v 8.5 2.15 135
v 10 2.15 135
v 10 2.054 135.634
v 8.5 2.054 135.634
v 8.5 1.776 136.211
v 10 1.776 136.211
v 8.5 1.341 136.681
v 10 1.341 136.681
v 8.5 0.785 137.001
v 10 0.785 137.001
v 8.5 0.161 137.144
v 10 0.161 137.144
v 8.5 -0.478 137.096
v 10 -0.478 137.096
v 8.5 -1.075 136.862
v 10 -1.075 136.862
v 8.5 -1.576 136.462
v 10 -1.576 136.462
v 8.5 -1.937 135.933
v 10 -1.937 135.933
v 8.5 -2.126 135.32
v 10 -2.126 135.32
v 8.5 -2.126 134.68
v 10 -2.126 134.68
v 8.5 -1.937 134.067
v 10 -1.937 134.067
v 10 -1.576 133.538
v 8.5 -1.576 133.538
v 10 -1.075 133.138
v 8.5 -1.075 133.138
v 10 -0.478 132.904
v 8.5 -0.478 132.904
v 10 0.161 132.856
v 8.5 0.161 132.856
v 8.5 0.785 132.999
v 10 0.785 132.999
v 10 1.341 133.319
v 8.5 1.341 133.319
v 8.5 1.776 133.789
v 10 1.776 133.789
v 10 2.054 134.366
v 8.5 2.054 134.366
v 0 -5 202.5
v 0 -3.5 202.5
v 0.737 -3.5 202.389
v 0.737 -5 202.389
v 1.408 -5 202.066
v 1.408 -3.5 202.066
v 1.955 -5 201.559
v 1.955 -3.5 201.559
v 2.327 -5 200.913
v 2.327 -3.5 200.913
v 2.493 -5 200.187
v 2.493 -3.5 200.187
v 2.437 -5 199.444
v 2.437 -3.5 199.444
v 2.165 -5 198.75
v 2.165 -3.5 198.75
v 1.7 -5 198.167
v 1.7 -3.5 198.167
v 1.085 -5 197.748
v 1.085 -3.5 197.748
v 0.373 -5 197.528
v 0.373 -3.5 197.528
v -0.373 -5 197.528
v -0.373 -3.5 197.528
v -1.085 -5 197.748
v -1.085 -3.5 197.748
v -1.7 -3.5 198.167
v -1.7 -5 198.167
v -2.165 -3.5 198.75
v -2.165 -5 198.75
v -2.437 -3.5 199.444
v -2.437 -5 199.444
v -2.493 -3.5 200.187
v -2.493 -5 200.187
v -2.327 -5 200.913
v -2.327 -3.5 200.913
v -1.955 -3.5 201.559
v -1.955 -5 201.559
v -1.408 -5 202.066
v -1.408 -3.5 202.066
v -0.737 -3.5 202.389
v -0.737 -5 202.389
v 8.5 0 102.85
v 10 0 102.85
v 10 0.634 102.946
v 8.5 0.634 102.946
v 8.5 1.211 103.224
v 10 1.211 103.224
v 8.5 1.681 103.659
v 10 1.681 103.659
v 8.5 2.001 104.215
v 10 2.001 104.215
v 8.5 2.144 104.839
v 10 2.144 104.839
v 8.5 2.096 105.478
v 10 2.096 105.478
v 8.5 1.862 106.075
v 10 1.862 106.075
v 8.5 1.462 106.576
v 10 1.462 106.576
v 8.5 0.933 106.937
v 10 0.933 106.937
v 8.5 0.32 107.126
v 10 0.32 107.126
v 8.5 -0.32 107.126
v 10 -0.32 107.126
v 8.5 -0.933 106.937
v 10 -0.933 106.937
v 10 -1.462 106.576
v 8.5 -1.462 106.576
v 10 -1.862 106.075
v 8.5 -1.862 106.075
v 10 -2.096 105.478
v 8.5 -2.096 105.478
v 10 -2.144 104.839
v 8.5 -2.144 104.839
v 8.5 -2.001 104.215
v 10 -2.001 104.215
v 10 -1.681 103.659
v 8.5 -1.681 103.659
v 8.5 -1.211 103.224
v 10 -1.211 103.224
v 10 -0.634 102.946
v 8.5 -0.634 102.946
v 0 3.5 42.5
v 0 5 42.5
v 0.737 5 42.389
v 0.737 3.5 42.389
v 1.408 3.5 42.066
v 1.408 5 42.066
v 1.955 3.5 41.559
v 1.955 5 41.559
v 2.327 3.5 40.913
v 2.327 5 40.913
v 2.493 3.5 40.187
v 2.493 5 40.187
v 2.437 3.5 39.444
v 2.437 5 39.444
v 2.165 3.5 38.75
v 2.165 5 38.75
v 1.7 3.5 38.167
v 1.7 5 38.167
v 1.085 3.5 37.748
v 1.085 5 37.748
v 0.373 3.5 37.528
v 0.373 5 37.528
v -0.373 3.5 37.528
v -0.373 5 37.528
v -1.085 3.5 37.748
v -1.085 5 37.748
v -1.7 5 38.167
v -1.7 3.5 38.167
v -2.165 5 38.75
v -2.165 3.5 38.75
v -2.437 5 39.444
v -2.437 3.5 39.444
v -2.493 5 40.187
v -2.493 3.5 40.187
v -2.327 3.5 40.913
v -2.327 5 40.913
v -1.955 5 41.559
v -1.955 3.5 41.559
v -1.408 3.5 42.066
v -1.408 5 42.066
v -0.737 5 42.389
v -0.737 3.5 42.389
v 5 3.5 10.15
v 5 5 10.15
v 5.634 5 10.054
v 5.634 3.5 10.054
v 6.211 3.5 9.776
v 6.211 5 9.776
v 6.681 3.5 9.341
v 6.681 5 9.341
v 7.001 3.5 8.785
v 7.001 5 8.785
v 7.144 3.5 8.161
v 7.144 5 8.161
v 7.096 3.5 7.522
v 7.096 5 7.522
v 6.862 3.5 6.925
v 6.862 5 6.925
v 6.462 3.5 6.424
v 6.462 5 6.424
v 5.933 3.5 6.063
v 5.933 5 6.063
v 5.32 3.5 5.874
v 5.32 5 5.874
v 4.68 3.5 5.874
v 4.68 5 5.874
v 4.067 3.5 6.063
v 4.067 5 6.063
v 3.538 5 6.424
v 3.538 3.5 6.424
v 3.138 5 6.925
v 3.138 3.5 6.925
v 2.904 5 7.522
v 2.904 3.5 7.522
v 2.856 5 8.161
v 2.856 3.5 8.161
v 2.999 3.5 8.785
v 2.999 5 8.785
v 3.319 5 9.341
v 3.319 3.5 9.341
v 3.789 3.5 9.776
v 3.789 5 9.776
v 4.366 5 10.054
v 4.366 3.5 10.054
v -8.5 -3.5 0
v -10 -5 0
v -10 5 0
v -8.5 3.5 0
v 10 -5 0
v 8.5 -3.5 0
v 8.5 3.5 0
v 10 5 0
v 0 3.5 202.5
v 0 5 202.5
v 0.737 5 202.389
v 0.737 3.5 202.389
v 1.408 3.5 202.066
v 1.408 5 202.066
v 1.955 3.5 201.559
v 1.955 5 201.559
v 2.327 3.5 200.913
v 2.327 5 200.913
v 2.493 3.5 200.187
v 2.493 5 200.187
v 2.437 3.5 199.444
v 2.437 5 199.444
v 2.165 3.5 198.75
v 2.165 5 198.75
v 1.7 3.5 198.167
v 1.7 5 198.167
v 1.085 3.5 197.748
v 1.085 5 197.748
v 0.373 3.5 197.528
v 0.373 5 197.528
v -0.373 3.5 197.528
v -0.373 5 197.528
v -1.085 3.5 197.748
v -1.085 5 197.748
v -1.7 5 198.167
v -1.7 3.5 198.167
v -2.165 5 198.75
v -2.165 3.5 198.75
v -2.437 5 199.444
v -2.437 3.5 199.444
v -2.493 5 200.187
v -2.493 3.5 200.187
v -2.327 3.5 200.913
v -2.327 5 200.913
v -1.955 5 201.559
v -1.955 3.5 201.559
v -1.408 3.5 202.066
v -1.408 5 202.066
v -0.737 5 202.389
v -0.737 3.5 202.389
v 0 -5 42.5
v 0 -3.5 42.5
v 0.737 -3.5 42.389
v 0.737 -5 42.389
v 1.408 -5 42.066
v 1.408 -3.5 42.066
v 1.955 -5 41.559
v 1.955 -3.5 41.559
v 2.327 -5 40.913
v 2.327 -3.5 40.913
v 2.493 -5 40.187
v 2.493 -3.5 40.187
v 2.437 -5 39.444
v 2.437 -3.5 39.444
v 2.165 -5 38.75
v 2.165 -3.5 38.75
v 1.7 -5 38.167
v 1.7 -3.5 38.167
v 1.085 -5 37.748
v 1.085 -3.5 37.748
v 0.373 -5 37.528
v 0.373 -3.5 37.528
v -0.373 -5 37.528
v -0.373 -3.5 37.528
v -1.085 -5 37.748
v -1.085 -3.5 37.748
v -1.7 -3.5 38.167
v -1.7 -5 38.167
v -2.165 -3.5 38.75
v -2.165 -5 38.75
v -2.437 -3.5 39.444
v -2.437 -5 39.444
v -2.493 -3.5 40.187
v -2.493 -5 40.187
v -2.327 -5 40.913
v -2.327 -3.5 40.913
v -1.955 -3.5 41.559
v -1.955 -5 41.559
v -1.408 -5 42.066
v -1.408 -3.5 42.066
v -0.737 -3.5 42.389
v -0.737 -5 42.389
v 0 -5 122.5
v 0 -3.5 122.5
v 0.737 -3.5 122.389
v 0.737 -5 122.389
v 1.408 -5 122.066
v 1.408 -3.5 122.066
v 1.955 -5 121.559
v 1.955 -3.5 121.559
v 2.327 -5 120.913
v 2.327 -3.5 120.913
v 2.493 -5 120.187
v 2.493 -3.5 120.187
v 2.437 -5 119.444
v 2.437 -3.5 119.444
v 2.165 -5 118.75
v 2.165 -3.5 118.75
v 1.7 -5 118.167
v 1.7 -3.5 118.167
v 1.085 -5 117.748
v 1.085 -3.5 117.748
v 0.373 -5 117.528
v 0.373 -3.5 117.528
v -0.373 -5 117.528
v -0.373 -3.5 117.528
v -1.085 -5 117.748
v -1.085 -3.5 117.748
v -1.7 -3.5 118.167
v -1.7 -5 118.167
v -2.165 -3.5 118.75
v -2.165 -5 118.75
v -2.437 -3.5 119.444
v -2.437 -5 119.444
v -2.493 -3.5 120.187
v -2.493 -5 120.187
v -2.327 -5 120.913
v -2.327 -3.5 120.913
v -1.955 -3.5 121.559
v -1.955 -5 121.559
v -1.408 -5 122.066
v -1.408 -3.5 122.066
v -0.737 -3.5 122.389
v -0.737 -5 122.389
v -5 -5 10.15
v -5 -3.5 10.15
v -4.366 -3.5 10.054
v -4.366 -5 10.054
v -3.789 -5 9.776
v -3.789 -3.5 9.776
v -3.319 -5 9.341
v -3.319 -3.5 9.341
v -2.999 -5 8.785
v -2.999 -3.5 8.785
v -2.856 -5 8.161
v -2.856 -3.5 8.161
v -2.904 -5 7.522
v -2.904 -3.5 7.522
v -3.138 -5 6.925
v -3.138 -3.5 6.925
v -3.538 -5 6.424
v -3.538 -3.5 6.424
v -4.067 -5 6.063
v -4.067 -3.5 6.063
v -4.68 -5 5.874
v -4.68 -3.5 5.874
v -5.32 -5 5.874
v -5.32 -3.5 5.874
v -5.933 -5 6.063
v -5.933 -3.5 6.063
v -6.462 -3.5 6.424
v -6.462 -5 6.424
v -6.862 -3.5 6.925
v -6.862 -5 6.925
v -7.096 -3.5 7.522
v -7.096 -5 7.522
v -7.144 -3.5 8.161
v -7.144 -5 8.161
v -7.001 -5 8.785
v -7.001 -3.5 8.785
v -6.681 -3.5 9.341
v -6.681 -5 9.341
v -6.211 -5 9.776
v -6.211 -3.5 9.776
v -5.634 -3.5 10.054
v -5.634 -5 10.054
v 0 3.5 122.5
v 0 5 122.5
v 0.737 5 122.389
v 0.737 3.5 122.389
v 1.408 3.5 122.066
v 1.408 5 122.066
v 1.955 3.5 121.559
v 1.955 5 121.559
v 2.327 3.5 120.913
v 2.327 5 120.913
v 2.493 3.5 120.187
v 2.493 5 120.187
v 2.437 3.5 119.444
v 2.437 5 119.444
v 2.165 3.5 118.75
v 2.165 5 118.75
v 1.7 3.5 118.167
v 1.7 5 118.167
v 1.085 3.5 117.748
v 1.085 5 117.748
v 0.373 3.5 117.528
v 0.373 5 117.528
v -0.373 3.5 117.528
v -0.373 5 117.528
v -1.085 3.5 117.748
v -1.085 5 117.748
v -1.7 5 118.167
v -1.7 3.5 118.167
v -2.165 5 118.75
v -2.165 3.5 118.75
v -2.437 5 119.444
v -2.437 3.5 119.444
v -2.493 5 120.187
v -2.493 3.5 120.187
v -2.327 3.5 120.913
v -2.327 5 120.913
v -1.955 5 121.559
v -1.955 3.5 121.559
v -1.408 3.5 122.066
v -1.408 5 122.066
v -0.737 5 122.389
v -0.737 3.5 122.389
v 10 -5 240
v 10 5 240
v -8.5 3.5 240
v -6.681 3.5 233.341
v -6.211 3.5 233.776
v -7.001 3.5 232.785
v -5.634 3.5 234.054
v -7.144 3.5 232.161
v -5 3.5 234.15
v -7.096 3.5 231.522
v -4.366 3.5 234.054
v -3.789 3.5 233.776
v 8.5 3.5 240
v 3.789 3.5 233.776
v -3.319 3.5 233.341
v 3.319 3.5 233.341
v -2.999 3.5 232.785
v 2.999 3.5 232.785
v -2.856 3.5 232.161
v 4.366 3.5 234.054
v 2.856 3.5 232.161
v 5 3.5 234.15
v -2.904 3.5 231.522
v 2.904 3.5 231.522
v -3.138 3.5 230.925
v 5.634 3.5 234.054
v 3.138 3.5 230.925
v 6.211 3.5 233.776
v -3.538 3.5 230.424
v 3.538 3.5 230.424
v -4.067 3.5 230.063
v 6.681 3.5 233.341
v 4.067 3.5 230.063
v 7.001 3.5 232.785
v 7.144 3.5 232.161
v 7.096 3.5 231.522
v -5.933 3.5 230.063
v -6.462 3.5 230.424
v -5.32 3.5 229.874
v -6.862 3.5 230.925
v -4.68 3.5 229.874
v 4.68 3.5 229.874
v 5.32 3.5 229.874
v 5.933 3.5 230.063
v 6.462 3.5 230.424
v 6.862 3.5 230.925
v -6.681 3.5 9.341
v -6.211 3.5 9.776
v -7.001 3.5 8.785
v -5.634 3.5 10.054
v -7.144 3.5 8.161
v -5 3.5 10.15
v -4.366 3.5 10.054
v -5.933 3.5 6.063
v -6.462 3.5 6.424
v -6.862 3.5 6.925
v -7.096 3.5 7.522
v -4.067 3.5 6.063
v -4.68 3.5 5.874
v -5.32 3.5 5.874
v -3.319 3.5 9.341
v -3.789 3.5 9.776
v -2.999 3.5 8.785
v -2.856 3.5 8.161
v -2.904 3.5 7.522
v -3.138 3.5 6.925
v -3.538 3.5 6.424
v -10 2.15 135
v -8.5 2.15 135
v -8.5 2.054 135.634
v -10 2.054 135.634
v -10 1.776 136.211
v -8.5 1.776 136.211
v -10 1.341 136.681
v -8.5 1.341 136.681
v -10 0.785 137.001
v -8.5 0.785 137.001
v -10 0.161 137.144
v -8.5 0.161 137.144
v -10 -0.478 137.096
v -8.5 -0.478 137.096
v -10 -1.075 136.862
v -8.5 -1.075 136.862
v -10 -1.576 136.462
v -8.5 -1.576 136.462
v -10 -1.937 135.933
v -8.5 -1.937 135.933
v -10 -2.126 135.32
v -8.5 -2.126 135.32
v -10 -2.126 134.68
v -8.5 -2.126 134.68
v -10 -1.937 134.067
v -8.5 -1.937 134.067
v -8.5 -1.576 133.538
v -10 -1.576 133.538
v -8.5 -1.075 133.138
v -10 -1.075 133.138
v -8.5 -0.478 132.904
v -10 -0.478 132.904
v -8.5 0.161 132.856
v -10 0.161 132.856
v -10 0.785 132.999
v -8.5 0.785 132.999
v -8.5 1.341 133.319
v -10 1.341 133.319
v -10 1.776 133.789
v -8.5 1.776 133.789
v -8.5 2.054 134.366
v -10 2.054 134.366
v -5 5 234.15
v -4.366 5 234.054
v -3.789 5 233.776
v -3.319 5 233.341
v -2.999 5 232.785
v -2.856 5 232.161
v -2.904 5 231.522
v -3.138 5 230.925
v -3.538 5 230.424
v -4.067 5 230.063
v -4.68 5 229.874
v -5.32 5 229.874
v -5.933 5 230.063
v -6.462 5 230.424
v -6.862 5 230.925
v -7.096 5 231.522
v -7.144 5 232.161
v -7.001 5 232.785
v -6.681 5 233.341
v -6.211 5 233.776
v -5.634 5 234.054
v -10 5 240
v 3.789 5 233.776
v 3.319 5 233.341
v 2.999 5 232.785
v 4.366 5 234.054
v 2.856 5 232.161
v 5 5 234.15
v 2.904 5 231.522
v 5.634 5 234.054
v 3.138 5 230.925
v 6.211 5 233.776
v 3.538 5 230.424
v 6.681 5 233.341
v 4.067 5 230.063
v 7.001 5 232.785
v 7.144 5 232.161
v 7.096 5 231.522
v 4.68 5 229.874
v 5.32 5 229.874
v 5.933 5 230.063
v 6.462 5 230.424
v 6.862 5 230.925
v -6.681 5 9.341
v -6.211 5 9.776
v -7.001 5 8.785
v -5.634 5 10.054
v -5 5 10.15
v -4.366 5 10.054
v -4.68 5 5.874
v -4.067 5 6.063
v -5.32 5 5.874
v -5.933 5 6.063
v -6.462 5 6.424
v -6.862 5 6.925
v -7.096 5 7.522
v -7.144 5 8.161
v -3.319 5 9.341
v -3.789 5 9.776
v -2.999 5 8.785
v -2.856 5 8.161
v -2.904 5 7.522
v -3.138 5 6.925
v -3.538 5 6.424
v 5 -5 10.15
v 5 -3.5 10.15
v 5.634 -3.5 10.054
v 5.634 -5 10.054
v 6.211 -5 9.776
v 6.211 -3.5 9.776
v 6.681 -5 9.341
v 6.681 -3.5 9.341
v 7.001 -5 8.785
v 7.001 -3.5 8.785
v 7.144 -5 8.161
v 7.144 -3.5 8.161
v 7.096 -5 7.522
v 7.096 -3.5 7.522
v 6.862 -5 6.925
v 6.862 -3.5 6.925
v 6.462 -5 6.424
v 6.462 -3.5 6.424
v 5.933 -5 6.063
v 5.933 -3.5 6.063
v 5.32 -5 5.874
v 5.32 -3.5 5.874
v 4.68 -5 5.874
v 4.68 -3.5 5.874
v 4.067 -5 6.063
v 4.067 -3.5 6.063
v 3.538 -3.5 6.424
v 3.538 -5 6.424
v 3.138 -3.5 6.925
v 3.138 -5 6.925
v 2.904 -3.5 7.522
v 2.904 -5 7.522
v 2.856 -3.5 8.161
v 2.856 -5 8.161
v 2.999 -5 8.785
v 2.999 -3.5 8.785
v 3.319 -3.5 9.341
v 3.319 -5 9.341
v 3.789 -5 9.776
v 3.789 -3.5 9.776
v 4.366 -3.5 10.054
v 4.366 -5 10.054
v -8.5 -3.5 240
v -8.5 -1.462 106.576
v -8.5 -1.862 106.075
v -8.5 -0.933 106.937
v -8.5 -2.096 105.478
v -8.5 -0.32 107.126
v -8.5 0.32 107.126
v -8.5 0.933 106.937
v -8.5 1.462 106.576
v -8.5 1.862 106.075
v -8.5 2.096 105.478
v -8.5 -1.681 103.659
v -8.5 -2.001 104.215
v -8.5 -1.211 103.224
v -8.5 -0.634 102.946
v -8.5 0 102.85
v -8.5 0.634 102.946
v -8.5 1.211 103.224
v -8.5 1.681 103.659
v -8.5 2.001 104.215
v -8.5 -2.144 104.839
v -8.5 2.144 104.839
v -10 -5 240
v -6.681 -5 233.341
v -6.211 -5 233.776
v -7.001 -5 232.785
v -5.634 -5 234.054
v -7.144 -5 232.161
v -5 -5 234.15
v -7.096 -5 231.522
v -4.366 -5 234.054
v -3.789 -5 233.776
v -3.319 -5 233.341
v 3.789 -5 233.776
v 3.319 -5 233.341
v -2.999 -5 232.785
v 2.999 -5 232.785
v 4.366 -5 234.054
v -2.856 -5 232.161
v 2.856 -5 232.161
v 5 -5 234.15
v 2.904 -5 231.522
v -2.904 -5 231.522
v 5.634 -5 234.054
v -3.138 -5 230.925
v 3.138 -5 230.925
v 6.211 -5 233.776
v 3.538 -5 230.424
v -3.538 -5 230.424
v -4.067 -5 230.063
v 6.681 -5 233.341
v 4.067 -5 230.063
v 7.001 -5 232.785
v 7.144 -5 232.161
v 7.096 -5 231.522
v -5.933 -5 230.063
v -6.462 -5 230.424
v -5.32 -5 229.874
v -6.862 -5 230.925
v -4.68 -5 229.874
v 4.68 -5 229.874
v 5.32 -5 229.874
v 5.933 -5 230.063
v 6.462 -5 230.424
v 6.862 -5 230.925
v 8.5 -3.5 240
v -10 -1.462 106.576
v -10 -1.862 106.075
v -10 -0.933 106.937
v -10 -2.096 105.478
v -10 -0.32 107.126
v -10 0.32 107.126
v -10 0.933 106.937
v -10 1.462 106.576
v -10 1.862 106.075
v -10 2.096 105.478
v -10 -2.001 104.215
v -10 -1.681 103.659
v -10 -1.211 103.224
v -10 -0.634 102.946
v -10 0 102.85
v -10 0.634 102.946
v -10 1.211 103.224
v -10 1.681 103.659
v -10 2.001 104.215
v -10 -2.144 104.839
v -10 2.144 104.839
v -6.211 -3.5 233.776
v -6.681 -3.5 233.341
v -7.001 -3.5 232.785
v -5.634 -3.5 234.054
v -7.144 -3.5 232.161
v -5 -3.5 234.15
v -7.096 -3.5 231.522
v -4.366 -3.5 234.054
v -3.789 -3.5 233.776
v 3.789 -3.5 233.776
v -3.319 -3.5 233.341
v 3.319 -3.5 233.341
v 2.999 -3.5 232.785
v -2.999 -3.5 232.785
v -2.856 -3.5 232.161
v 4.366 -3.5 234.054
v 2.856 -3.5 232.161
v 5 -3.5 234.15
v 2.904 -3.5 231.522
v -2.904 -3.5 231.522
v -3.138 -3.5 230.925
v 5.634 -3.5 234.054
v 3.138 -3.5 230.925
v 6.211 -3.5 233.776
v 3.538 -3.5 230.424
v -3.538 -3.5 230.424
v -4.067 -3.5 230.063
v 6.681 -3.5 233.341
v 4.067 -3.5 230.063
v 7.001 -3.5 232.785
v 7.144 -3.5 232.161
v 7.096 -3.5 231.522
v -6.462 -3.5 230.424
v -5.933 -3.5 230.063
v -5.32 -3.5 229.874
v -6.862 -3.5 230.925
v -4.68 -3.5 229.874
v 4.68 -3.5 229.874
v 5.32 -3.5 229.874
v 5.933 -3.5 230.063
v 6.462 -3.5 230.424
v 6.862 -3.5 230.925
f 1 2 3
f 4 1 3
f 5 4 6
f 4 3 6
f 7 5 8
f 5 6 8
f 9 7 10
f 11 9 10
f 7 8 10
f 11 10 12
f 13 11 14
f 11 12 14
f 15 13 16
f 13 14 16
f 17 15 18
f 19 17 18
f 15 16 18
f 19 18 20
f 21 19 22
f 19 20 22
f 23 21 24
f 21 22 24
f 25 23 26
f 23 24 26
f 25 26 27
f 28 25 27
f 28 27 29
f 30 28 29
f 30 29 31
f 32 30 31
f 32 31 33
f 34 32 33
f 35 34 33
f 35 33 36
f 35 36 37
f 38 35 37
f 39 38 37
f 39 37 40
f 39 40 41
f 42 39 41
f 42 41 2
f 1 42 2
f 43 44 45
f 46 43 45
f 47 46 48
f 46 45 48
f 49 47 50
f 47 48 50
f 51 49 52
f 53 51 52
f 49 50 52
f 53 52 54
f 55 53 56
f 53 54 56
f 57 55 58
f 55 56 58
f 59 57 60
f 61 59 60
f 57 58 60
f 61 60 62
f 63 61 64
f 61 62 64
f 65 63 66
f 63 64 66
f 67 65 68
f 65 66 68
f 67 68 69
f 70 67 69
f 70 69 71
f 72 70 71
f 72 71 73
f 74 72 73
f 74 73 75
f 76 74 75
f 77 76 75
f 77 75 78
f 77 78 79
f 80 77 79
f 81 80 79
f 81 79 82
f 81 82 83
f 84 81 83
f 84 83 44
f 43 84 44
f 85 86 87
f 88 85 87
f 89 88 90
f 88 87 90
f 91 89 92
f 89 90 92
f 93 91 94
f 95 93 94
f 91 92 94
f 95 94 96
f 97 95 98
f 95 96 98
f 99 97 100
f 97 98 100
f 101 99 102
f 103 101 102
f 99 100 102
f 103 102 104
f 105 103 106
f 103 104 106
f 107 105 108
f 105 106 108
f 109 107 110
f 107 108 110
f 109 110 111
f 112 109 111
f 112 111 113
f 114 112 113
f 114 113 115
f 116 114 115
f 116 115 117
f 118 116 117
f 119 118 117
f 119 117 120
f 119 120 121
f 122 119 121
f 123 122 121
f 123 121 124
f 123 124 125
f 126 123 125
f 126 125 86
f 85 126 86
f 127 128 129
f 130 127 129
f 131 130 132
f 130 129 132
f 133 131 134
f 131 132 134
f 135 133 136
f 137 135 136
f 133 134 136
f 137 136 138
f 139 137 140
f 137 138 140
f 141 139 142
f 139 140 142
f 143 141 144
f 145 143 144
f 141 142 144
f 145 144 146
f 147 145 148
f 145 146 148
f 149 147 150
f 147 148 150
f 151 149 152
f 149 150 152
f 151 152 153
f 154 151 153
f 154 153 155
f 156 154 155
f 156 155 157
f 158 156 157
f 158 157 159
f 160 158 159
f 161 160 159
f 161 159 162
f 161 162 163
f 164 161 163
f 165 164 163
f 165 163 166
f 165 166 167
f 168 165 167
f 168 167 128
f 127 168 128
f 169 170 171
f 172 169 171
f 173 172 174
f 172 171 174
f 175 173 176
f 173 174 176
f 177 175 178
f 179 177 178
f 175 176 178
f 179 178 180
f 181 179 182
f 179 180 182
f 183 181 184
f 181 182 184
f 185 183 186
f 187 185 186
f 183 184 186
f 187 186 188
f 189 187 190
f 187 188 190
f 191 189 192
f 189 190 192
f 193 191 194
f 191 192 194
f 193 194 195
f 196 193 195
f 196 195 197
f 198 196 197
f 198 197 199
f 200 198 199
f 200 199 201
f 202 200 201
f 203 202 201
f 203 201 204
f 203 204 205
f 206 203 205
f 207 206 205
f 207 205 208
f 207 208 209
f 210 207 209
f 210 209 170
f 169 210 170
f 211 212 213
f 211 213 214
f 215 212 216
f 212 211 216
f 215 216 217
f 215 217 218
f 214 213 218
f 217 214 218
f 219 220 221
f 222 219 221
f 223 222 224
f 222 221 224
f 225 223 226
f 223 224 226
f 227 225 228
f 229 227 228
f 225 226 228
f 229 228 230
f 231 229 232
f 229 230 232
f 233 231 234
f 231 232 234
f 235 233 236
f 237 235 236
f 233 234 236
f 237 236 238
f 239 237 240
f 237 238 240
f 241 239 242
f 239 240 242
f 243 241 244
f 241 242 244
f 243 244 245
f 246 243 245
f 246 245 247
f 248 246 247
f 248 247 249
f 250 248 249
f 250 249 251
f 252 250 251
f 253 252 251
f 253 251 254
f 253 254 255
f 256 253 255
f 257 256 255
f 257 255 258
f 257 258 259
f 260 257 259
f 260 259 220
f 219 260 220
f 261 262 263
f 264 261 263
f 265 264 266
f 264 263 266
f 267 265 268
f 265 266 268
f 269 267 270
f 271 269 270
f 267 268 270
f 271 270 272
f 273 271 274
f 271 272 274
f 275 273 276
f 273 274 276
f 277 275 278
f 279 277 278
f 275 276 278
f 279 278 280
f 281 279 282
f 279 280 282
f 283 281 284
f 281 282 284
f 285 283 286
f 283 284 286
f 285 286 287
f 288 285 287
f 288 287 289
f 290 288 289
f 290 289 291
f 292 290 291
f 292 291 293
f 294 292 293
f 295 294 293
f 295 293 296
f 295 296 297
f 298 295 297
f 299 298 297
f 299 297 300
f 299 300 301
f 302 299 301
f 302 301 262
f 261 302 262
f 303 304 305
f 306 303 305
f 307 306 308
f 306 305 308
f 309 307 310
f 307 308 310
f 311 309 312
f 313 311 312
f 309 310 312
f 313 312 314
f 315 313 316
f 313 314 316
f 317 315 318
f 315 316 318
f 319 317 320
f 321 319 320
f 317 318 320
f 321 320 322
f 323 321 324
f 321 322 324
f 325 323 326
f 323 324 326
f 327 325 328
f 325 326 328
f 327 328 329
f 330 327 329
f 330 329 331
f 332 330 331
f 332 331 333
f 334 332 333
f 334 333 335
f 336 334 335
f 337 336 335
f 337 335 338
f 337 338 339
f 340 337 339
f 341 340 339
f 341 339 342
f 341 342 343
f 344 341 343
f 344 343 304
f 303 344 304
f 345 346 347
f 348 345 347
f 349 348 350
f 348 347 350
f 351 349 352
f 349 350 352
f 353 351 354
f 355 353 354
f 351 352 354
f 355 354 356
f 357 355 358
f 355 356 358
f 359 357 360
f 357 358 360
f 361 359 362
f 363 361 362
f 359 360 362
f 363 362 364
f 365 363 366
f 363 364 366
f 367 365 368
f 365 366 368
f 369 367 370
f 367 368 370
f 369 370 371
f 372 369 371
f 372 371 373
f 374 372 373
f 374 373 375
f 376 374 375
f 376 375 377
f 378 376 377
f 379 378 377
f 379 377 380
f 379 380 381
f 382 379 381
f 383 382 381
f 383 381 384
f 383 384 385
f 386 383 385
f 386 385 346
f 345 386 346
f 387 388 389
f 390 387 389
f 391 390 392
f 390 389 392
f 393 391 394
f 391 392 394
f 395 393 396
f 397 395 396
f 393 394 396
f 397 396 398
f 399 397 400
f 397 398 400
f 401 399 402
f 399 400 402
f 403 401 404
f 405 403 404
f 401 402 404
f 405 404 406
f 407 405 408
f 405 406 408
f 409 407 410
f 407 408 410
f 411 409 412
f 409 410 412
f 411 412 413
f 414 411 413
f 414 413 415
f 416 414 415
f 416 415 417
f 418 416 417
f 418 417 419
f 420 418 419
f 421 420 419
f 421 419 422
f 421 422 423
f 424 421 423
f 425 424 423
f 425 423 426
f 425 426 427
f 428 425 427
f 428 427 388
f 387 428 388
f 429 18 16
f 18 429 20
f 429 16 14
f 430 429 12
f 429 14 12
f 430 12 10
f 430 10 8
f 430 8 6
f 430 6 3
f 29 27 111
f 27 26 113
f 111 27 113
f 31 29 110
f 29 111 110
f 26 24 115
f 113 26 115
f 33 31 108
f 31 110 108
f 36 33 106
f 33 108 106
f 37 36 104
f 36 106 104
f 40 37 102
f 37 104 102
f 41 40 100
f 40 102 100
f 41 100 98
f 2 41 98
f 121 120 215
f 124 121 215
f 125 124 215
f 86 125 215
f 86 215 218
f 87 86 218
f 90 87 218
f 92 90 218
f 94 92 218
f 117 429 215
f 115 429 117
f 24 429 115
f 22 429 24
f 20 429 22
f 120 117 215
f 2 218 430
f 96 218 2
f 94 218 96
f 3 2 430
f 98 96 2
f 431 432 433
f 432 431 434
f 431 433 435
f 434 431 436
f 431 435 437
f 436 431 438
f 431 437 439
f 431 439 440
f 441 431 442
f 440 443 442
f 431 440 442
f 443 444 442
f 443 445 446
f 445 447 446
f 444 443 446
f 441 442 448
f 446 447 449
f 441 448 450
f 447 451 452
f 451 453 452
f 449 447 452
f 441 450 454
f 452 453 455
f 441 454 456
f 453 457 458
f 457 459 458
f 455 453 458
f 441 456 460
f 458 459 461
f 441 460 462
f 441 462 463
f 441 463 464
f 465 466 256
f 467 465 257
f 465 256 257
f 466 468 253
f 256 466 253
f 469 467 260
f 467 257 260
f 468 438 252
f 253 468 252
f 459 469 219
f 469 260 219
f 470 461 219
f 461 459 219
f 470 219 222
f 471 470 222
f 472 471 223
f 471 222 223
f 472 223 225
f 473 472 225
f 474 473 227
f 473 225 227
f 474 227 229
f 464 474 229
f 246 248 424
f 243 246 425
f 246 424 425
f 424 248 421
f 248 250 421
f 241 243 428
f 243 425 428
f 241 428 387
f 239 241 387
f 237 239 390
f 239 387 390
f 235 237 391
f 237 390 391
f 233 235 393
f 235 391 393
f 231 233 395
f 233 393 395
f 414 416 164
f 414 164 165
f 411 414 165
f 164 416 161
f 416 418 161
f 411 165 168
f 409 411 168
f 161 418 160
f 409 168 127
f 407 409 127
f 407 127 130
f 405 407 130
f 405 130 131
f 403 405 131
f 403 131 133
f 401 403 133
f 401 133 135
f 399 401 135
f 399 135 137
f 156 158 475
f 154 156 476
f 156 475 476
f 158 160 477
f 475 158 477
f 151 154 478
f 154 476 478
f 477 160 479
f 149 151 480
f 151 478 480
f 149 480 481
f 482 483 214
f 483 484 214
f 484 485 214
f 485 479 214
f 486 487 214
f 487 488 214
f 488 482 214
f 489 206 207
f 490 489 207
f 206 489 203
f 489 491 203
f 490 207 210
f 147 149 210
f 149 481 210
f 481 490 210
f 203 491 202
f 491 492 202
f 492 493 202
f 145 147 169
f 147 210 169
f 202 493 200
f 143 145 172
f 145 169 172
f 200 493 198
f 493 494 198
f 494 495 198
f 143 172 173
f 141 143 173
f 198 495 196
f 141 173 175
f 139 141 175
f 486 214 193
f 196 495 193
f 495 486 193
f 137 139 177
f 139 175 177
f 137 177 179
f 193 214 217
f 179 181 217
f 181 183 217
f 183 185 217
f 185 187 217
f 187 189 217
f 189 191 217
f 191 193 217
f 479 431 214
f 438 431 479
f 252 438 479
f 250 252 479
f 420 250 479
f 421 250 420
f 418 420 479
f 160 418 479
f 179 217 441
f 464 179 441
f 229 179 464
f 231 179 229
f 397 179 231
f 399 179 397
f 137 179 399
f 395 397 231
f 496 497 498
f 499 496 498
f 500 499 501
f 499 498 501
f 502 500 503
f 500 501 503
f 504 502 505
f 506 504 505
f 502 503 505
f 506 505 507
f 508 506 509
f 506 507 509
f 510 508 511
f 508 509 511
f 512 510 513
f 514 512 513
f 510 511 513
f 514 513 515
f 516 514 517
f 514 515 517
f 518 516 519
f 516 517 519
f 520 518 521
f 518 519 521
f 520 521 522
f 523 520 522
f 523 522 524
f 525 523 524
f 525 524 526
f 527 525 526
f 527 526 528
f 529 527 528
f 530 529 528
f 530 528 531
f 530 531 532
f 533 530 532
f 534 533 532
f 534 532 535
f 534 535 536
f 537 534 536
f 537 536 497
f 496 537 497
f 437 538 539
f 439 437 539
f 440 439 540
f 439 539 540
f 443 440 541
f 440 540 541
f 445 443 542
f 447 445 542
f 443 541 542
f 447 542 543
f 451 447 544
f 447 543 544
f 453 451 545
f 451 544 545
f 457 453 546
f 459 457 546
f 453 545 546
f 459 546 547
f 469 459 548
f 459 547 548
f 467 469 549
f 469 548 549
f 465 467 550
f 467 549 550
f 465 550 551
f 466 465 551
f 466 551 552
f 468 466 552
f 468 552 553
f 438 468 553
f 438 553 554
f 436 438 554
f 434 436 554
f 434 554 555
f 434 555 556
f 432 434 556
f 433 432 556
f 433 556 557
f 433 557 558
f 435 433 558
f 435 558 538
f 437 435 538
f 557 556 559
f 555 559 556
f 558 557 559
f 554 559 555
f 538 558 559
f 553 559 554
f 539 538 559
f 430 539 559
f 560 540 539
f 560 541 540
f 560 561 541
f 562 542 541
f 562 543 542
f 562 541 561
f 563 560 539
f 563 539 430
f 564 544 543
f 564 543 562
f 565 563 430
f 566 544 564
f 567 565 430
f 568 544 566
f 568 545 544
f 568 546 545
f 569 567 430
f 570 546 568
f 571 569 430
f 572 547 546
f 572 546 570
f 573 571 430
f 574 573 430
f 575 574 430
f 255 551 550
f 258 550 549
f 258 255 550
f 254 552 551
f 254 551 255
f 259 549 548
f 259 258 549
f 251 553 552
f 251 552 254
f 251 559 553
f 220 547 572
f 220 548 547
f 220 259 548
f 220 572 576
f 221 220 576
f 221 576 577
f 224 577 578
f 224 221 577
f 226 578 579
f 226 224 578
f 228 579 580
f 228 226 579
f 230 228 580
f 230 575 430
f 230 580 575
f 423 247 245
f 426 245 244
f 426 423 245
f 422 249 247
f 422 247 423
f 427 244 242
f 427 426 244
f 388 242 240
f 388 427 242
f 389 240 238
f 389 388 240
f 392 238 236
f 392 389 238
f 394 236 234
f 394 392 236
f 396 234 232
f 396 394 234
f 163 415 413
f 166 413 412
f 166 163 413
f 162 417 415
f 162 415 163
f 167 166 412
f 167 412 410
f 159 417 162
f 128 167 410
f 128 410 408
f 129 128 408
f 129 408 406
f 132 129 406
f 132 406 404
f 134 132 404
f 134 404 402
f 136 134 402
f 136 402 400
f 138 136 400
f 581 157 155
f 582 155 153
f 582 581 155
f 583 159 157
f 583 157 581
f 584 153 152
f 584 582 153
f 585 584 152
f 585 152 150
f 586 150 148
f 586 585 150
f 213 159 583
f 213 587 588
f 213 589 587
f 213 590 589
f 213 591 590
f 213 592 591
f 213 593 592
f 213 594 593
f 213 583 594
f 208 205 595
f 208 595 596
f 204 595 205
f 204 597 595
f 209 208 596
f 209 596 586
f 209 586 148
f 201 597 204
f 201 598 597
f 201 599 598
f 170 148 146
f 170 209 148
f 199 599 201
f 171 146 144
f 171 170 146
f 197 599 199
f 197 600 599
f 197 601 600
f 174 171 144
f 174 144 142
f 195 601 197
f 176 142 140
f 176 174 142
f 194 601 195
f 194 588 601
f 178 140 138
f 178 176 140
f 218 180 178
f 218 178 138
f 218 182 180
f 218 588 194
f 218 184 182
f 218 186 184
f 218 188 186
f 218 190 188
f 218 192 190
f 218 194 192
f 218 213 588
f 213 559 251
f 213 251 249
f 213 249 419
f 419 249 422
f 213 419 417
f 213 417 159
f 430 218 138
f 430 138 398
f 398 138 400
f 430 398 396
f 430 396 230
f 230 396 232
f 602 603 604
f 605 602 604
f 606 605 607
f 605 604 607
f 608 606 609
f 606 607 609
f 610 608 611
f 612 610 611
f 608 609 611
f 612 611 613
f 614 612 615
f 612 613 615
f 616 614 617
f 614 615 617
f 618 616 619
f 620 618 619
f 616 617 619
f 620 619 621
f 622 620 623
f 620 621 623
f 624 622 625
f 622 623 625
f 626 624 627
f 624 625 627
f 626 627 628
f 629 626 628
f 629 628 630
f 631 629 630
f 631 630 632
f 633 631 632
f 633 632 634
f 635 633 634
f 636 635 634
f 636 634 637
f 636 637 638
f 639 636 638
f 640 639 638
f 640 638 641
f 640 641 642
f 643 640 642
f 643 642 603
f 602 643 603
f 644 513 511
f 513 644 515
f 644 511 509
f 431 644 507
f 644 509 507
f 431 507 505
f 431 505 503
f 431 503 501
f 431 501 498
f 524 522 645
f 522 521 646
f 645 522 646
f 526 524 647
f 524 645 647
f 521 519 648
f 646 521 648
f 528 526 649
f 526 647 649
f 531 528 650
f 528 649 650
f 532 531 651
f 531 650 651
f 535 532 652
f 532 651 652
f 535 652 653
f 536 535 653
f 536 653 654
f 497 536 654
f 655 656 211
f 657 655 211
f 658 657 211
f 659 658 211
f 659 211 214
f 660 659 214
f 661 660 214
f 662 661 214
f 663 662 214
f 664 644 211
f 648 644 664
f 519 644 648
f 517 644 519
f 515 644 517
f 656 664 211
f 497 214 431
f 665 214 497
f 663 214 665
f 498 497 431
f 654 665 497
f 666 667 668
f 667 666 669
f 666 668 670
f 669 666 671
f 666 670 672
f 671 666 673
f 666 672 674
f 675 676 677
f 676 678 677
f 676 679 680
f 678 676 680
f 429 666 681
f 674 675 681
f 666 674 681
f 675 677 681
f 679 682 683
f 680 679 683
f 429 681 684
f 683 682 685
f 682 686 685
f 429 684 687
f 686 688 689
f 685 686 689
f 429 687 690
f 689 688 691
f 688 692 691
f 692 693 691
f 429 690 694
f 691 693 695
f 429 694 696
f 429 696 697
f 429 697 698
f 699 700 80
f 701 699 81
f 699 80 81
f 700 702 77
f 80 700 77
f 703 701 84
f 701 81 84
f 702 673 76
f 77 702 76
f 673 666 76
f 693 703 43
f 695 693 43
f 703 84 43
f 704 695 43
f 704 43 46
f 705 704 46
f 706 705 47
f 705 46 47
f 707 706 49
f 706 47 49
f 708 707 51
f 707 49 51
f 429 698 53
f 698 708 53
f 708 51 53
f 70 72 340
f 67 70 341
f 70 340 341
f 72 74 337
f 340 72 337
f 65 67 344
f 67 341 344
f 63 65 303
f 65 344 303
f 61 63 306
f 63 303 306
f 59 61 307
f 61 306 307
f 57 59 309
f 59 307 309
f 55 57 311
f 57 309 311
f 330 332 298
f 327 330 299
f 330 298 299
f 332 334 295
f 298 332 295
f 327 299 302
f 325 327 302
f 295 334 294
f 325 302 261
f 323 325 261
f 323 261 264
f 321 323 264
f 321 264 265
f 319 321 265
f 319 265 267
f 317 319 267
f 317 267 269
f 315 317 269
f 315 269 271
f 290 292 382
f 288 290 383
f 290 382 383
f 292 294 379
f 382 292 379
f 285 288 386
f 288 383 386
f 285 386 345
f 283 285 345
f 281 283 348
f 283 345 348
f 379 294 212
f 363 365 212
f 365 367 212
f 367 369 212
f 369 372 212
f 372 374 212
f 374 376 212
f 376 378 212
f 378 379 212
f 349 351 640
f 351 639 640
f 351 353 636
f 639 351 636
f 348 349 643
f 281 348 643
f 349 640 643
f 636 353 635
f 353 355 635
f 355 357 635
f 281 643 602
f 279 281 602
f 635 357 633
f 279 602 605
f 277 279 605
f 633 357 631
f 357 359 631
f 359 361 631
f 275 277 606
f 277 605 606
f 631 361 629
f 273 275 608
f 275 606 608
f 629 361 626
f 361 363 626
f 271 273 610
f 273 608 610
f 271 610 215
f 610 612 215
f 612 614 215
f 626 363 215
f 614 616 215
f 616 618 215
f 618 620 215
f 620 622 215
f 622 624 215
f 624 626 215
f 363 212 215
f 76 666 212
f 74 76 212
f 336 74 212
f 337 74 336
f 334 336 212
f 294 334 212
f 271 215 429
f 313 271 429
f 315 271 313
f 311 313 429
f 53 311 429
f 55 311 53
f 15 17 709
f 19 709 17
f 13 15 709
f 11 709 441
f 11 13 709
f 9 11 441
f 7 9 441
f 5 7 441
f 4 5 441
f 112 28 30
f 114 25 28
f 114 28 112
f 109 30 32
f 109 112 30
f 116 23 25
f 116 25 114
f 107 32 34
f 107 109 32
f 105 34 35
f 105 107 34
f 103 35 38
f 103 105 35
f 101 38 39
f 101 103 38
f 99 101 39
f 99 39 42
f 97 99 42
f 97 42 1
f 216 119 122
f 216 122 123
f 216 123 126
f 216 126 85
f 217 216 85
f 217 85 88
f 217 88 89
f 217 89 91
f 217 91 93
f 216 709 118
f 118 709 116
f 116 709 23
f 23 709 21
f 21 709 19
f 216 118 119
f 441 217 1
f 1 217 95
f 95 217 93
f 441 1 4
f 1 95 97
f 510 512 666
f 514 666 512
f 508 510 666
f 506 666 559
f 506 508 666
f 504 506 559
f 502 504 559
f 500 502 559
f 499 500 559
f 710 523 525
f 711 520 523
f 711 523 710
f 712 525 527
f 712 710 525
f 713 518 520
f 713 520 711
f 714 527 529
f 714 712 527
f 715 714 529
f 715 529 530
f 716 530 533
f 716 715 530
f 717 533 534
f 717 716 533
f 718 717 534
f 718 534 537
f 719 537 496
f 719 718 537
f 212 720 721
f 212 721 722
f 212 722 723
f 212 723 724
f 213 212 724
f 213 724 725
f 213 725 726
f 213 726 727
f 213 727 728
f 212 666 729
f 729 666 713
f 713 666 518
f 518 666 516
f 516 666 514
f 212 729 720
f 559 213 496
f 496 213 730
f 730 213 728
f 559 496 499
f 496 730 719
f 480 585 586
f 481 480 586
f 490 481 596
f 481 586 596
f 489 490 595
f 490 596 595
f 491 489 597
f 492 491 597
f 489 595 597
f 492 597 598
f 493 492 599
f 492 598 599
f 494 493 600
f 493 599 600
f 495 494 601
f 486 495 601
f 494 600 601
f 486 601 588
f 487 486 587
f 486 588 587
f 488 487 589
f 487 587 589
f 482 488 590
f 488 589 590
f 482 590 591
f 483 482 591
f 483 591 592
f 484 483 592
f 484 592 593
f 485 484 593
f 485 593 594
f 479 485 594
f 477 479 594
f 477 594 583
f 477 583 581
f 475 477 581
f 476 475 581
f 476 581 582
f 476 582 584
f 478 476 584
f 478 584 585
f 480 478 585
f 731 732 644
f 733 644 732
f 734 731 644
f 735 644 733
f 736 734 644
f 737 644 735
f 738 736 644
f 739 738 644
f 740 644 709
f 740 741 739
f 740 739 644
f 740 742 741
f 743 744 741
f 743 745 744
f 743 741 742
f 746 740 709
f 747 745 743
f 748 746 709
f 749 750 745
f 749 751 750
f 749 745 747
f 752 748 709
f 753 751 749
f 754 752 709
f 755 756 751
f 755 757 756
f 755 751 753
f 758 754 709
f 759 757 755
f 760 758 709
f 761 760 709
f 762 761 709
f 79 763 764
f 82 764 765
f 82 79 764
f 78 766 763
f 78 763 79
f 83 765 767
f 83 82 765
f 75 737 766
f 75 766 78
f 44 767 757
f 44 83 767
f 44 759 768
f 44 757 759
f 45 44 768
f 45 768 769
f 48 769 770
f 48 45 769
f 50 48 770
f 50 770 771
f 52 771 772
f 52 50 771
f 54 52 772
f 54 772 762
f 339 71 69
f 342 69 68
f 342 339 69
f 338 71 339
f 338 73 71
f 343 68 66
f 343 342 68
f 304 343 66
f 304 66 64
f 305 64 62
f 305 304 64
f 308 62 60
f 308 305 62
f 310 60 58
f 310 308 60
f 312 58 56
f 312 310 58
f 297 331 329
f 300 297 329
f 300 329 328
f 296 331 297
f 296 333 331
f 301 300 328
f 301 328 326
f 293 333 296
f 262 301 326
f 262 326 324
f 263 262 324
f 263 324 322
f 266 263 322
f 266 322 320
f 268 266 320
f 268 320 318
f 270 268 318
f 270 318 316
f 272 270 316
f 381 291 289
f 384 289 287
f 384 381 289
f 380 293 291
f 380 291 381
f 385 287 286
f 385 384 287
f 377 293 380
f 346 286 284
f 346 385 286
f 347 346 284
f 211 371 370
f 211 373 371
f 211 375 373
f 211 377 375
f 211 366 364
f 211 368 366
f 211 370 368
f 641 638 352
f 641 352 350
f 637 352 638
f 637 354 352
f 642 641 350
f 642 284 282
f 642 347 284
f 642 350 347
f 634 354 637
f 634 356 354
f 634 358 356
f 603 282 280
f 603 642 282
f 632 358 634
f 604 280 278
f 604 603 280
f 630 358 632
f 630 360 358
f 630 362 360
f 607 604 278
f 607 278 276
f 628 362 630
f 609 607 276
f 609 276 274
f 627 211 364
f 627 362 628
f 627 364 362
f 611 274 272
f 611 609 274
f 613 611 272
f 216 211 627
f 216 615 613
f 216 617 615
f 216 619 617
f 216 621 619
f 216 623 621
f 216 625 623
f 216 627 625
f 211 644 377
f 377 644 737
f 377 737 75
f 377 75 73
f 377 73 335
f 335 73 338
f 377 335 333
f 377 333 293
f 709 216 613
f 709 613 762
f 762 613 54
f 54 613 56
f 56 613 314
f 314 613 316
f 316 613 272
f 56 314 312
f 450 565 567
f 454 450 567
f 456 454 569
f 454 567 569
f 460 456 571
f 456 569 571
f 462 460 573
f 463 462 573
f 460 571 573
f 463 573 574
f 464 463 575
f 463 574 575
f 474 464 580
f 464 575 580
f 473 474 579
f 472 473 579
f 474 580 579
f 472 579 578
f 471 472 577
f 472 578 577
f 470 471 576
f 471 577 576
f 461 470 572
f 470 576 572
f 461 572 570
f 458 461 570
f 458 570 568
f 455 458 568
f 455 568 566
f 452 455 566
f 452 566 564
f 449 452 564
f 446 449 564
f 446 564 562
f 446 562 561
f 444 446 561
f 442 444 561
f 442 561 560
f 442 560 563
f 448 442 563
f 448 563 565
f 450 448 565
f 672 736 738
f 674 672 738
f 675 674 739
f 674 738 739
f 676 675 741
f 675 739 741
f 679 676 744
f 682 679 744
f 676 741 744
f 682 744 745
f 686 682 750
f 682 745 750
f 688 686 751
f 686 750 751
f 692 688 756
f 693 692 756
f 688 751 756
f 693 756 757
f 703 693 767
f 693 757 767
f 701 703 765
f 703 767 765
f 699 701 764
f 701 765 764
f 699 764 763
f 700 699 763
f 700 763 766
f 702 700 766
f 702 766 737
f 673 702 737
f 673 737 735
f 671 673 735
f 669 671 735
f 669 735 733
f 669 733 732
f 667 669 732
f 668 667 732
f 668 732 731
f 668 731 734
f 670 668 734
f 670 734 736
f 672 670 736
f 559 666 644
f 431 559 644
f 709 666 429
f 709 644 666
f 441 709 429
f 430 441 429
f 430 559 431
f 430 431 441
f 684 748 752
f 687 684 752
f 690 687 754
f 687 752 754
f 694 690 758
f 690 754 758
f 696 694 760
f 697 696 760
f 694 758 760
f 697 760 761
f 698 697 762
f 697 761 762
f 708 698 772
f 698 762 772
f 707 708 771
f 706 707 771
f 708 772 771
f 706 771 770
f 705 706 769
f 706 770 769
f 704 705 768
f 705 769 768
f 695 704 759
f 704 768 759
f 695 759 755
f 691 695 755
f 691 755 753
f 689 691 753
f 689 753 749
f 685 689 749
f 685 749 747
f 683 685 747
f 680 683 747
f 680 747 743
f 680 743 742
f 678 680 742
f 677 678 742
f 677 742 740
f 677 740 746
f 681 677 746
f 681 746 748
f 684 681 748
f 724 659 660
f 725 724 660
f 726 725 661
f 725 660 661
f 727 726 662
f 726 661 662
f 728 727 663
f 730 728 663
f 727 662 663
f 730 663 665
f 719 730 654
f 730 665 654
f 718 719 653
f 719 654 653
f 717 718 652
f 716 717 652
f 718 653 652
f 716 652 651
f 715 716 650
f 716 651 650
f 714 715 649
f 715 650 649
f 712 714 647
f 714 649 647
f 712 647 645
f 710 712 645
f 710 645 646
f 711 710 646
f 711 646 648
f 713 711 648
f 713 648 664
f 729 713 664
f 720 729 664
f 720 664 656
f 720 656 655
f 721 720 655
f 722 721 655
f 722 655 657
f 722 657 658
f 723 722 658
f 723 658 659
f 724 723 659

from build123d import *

# Parameters (mm, degrees)
SKETCH_1_W          = 20
SKETCH_1_H          = 10
SKETCH_1_W_2        = 17
SKETCH_1_H_2        = 7
EXTRUDE_1_DEPTH     = 240
SKETCH_2_R          = 2.15
SKETCH_2_R_2        = 2.5
CUT_EXTRUDE_1_DEPTH = 241.416305603
SKETCH_3_R          = 2.15
CUT_EXTRUDE_2_DEPTH = 241.883789409


with BuildPart() as part:
    # ｽｹｯﾁ1 → 押し出し-薄板1 (new body)
    with BuildSketch(Plane.XY):
        Rectangle(SKETCH_1_W, SKETCH_1_H)
        Rectangle(SKETCH_1_W_2, SKETCH_1_H_2, mode=Mode.SUBTRACT)
    extrude(amount=EXTRUDE_1_DEPTH)

    # ｽｹｯﾁ2 → ｶｯﾄ - 押し出し1 (cut, through all)
    with BuildSketch(Plane(origin=(0, 5, 0), x_dir=(1, 0, 0), z_dir=(0, 1, 0))):
        with Locations(Location((5, -232, 0), (0, 0, 270))):
            Circle(SKETCH_2_R)
        with Locations(Location((-5, -232, 0), (0, 0, 270))):
            Circle(SKETCH_2_R)
        with Locations(Location((5, -8, 0), (0, 0, 270))):
            Circle(SKETCH_2_R)
        with Locations(Location((-5, -8, 0), (0, 0, 270))):
            Circle(SKETCH_2_R)
        with Locations(Location((0, -40, 0), (0, 0, 270))):
            Circle(SKETCH_2_R_2)
        with Locations(Location((0, -200, 0), (0, 0, 270))):
            Circle(SKETCH_2_R_2)
        with Locations(Location((0, -120, 0), (0, 0, 270))):
            Circle(SKETCH_2_R_2)
    extrude(amount=-CUT_EXTRUDE_1_DEPTH, mode=Mode.SUBTRACT)

    # ｽｹｯﾁ3 → ｶｯﾄ - 押し出し2 (cut, through all)
    with BuildSketch(Plane(origin=(10, 0, 0), x_dir=(0, 0, -1), z_dir=(1, 0, 0))):
        with Locations((-105, 0)):
            Circle(SKETCH_3_R)
        with Locations(Location((-135, 0, 0), (0, 0, 90))):
            Circle(SKETCH_3_R)
    extrude(amount=-CUT_EXTRUDE_2_DEPTH, mode=Mode.SUBTRACT)


solid = part.part
